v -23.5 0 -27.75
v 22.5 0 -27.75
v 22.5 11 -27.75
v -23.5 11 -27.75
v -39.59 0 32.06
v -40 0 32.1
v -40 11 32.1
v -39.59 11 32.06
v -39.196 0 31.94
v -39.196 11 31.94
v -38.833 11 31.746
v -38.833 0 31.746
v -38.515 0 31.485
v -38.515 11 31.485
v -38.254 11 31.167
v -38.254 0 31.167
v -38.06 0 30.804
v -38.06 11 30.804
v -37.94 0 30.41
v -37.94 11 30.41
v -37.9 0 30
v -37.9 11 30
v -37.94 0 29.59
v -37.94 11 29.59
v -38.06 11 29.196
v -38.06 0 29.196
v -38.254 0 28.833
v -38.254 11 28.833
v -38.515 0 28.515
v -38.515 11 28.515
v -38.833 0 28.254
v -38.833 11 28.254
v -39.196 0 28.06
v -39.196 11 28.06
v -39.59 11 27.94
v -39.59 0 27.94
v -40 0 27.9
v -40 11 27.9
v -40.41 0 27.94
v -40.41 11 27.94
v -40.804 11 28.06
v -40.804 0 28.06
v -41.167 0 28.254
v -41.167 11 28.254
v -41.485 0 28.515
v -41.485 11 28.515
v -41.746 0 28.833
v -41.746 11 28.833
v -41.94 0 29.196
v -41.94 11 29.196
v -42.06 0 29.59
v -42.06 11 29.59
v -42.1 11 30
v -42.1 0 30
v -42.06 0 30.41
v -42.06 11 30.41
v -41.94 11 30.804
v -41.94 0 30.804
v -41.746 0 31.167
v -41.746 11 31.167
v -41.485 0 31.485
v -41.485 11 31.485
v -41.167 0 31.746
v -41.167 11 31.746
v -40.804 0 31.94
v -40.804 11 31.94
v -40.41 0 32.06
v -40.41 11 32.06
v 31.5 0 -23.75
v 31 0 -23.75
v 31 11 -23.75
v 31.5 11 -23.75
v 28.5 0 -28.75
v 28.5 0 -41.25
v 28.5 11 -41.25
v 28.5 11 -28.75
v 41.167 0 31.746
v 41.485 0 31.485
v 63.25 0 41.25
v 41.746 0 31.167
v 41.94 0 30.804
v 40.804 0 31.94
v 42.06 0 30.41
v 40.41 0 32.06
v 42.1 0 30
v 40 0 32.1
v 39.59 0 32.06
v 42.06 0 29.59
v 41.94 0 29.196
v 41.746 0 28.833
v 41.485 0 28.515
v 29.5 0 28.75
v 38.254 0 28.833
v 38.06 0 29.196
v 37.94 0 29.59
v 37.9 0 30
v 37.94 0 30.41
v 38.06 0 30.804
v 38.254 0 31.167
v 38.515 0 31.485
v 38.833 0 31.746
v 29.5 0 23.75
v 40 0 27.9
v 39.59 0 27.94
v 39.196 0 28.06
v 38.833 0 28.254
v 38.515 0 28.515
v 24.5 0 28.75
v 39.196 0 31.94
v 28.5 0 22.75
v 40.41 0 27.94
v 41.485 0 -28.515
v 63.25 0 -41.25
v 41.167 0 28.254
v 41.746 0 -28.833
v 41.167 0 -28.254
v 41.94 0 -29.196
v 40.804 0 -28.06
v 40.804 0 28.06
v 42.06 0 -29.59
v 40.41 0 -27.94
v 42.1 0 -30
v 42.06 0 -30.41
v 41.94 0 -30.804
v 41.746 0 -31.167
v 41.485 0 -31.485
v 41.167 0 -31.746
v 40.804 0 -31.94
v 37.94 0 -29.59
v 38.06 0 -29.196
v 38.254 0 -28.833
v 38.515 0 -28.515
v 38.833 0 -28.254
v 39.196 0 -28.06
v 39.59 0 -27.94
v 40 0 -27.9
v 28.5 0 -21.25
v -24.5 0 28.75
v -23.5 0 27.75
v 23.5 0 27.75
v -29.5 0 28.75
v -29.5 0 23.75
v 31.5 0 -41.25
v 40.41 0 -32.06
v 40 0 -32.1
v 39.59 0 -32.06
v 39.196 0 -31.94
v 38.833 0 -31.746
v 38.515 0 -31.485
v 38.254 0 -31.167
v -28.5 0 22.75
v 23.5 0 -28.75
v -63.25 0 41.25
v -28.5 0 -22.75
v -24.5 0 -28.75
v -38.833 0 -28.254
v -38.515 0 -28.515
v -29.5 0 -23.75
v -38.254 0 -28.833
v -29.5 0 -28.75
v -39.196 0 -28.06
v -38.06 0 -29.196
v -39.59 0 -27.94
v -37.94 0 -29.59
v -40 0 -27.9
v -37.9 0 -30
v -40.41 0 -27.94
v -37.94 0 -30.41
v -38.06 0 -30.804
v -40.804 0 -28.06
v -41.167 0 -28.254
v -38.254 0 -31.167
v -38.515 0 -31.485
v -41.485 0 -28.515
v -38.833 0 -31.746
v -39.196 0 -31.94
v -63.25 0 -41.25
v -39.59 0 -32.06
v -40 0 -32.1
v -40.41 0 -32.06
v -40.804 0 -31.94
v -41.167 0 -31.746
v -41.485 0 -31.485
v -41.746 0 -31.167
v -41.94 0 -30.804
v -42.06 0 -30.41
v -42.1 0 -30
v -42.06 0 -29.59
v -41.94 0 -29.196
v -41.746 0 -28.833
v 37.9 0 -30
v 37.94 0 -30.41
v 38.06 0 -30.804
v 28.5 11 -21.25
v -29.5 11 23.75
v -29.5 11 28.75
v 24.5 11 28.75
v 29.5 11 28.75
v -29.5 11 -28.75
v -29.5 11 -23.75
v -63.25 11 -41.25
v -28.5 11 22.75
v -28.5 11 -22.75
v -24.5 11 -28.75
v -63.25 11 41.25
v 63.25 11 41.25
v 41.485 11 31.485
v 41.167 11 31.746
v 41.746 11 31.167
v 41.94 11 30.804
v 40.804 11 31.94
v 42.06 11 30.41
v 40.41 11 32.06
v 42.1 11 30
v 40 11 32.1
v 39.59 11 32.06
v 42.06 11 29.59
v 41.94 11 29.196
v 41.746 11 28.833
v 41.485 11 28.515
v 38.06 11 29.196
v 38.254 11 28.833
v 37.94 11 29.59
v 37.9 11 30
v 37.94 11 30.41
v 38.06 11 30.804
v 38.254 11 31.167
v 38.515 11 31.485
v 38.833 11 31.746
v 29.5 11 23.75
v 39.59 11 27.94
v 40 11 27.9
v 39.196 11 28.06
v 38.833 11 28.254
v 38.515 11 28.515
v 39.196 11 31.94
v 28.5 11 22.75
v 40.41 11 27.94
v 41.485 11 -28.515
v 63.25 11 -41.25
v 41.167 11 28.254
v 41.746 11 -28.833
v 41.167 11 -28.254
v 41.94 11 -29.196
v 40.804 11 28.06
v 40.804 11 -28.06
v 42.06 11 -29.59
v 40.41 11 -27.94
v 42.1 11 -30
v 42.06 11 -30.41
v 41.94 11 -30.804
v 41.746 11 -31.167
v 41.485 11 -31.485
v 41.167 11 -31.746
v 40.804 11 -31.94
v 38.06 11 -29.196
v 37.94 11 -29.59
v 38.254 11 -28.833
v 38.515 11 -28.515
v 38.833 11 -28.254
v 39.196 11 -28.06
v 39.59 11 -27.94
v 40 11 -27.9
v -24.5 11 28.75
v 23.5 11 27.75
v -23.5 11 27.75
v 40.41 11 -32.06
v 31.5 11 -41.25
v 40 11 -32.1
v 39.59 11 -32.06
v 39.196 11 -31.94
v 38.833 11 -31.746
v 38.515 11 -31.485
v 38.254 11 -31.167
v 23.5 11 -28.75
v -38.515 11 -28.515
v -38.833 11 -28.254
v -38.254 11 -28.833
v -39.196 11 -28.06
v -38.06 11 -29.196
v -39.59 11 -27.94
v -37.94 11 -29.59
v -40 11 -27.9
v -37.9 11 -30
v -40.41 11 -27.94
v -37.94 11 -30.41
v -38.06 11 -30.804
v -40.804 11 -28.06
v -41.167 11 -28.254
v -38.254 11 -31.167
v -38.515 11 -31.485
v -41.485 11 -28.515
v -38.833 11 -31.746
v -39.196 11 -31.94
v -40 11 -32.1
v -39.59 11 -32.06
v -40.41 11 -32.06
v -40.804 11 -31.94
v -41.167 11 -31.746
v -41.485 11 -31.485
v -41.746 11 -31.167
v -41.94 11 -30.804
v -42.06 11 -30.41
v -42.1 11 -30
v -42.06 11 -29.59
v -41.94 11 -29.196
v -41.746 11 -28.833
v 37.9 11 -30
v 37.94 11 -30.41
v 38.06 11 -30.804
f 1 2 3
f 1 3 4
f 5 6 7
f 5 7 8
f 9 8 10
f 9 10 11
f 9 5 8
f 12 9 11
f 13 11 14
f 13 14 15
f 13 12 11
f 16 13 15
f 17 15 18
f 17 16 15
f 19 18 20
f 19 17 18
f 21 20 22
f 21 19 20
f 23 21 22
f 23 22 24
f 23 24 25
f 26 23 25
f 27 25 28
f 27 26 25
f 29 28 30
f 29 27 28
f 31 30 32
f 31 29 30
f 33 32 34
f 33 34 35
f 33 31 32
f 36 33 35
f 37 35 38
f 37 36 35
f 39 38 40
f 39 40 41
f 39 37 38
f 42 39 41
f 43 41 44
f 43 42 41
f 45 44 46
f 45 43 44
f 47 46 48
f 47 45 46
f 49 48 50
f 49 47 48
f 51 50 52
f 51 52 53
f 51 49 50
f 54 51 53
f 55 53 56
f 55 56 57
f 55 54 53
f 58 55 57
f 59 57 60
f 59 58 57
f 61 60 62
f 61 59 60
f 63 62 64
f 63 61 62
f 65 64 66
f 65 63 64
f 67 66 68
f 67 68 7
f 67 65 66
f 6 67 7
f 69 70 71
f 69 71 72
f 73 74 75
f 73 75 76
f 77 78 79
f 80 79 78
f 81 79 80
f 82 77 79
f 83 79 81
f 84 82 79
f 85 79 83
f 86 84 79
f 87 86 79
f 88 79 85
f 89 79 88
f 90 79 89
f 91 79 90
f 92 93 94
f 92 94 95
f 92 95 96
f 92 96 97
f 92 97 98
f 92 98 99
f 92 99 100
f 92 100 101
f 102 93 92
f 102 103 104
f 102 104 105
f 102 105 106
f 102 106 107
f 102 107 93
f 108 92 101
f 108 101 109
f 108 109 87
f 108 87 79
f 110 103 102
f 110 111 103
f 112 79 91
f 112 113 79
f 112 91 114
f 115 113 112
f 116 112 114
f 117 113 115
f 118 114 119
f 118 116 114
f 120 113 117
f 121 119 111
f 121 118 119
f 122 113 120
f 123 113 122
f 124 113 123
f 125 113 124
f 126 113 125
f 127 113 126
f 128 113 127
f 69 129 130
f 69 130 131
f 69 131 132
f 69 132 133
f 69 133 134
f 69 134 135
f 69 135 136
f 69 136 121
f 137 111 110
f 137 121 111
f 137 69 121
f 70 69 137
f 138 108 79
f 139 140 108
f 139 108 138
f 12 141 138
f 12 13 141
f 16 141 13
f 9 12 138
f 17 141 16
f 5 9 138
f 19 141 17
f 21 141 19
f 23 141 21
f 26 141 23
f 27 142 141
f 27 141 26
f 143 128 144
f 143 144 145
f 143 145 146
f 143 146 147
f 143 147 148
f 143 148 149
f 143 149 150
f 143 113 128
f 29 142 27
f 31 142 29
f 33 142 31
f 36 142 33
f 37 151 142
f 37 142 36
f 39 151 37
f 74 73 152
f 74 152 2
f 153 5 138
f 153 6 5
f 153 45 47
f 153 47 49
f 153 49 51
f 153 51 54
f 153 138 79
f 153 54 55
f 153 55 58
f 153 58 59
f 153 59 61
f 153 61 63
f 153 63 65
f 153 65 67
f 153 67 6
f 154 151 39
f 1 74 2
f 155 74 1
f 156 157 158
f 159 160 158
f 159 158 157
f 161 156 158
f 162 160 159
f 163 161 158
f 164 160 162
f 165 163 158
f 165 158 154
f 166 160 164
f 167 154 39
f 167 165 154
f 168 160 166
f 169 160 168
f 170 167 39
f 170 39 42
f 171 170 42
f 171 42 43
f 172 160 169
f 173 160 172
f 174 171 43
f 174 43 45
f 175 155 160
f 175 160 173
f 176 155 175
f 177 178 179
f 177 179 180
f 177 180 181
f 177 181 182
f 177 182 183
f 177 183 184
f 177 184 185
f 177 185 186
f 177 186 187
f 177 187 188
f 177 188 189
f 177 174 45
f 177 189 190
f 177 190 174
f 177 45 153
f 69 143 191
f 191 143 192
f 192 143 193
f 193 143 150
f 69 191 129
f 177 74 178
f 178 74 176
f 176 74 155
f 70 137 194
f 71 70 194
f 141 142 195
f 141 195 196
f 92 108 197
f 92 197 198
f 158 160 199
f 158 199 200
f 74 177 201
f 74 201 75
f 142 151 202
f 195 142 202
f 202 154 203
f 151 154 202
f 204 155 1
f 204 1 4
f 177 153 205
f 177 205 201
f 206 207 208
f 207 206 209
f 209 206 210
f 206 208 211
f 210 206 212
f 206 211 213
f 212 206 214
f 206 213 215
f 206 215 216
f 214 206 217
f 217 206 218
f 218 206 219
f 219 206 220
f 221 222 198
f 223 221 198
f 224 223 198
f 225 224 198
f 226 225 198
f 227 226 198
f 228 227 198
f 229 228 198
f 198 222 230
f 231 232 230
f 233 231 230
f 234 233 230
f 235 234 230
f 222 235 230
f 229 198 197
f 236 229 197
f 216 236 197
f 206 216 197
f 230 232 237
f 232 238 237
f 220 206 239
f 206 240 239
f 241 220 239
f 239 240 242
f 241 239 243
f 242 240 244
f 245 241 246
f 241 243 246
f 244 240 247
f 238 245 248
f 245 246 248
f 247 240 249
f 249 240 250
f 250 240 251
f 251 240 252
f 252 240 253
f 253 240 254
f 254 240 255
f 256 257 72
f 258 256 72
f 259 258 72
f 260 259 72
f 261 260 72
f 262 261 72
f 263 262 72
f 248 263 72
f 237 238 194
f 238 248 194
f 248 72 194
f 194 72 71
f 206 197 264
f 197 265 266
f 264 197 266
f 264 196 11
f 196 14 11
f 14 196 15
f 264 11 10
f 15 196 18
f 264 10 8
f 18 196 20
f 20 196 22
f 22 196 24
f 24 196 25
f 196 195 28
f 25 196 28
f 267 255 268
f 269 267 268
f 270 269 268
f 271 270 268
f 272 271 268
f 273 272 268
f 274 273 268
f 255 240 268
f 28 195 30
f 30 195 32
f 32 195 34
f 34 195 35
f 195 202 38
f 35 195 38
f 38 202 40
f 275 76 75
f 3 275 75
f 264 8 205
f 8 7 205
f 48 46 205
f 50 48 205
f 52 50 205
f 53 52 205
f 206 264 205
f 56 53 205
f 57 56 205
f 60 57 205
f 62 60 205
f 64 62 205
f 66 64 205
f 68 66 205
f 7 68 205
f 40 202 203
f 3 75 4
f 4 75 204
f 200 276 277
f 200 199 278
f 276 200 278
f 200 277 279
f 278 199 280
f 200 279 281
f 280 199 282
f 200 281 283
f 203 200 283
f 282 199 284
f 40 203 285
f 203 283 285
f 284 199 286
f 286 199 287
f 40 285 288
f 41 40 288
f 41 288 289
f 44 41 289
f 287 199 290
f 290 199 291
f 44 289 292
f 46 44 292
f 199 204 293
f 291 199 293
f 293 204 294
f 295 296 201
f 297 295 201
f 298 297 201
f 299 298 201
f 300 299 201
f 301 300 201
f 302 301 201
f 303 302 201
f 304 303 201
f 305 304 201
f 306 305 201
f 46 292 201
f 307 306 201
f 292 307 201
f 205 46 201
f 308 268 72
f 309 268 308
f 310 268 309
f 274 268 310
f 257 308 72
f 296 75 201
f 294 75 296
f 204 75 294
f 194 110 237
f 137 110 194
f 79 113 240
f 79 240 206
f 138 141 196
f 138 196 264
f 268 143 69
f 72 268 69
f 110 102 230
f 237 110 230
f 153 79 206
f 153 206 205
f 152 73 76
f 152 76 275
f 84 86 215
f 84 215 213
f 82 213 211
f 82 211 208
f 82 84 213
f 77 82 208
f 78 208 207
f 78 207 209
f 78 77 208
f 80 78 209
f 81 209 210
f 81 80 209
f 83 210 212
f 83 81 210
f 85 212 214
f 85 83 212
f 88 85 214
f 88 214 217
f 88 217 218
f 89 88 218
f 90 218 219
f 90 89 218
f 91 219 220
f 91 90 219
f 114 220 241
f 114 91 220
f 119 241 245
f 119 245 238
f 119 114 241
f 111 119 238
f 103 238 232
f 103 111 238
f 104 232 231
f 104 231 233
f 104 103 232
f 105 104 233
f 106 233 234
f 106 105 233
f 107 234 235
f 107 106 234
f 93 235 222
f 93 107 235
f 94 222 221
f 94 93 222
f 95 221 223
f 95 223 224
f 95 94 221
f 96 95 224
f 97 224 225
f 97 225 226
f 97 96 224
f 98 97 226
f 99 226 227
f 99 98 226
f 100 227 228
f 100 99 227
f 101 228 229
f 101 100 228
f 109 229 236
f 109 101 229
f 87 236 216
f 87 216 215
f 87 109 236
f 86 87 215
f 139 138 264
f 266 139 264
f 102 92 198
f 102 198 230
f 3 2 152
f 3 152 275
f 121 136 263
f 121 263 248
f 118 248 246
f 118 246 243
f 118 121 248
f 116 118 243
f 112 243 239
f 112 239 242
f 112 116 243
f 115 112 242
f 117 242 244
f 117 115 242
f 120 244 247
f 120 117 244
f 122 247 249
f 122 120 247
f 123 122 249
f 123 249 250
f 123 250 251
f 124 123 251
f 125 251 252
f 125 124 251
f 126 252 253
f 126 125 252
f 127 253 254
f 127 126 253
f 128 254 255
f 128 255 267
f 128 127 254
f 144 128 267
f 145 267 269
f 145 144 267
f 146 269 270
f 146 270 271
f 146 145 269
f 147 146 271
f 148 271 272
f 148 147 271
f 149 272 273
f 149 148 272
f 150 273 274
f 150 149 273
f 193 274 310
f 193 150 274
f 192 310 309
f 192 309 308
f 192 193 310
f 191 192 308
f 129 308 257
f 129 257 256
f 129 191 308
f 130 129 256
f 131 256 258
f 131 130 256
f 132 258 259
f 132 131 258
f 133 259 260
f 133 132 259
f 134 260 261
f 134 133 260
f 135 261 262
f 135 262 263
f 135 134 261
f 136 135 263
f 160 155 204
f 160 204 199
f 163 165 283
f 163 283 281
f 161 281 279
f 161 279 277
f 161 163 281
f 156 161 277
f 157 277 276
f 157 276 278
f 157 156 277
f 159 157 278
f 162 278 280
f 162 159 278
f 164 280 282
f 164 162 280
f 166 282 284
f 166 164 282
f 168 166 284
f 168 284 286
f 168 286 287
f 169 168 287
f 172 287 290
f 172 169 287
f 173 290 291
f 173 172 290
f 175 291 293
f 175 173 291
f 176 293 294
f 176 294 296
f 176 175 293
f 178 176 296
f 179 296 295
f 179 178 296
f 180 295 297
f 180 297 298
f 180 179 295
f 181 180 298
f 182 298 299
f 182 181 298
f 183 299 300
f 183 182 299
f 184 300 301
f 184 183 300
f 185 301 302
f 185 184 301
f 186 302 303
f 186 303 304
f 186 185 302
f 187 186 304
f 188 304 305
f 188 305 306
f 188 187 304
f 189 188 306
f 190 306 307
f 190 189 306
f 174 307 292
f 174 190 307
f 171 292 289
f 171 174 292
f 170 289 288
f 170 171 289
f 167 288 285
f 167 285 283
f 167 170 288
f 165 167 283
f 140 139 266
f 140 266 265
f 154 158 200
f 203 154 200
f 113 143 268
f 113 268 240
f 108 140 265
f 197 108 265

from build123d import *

# Parameters (mm, degrees)
SKETCH_1_R      = 2.1
EXTRUDE_2_DEPTH = 11
CHAMFER_1_SIZE  = 2.5
CHAMFER_2_SIZE  = 1


with BuildPart() as part:
    # Эскиз1 → Бобышка-Вытянуть2 (new body)
    with BuildSketch(Plane(origin=(0, 0, 0), x_dir=(1, 0, 0), z_dir=(0, 1, 0))):
        Polygon((31.5, 27.75), (31.5, 41.25), (63.25, 41.25), (63.25, -41.25), (-63.25, -41.25), (-63.25, 41.25), (28.5, 41.25), (28.5, 28.75), (23.5, 28.75), (23.5, 27.75), (-24.5, 27.75), (-24.5, 28.75), (-29.5, 28.75), (-29.5, 23.75), (-28.5, 23.75), (-28.5, -23.75), (-29.5, -23.75), (-29.5, -28.75), (-24.5, -28.75), (-24.5, -27.75), (24.5, -27.75), (24.5, -28.75), (29.5, -28.75), (29.5, -23.75), (28.5, -23.75), (28.5, 23.75), (31.5, 23.75), align=None)
        with Locations(Location((-40, 30, 0), (0, 0, 270))):
            Circle(SKETCH_1_R, mode=Mode.SUBTRACT)
        with Locations(Location((40, 30, 0), (0, 0, 270))):
            Circle(SKETCH_1_R, mode=Mode.SUBTRACT)
        with Locations(Location((40, -30, 0), (0, 0, 270))):
            Circle(SKETCH_1_R, mode=Mode.SUBTRACT)
        with Locations(Location((-40, -30, 0), (0, 0, 270))):
            Circle(SKETCH_1_R, mode=Mode.SUBTRACT)
    extrude(amount=EXTRUDE_2_DEPTH)

    # Фаска1
    chamfer_1_edges = [part.edges().sort_by_distance(p)[0] for p in [
        (28.5, 5.5, -23.75),
    ]]
    chamfer(chamfer_1_edges, length=CHAMFER_1_SIZE)

    # Фаска2
    chamfer_2_edges = [part.edges().sort_by_distance(p)[0] for p in [
        (23.5, 5.5, -27.75),
        (28.5, 5.5, 23.75),
        (24.5, 5.5, 27.75),
        (-24.5, 5.5, 27.75),
        (-28.5, 5.5, 23.75),
        (-28.5, 5.5, -23.75),
        (-24.5, 5.5, -27.75),
    ]]
    chamfer(chamfer_2_edges, length=CHAMFER_2_SIZE - 0.0001)  # a hair under: the kernel refuses the full size


solid = part.part
